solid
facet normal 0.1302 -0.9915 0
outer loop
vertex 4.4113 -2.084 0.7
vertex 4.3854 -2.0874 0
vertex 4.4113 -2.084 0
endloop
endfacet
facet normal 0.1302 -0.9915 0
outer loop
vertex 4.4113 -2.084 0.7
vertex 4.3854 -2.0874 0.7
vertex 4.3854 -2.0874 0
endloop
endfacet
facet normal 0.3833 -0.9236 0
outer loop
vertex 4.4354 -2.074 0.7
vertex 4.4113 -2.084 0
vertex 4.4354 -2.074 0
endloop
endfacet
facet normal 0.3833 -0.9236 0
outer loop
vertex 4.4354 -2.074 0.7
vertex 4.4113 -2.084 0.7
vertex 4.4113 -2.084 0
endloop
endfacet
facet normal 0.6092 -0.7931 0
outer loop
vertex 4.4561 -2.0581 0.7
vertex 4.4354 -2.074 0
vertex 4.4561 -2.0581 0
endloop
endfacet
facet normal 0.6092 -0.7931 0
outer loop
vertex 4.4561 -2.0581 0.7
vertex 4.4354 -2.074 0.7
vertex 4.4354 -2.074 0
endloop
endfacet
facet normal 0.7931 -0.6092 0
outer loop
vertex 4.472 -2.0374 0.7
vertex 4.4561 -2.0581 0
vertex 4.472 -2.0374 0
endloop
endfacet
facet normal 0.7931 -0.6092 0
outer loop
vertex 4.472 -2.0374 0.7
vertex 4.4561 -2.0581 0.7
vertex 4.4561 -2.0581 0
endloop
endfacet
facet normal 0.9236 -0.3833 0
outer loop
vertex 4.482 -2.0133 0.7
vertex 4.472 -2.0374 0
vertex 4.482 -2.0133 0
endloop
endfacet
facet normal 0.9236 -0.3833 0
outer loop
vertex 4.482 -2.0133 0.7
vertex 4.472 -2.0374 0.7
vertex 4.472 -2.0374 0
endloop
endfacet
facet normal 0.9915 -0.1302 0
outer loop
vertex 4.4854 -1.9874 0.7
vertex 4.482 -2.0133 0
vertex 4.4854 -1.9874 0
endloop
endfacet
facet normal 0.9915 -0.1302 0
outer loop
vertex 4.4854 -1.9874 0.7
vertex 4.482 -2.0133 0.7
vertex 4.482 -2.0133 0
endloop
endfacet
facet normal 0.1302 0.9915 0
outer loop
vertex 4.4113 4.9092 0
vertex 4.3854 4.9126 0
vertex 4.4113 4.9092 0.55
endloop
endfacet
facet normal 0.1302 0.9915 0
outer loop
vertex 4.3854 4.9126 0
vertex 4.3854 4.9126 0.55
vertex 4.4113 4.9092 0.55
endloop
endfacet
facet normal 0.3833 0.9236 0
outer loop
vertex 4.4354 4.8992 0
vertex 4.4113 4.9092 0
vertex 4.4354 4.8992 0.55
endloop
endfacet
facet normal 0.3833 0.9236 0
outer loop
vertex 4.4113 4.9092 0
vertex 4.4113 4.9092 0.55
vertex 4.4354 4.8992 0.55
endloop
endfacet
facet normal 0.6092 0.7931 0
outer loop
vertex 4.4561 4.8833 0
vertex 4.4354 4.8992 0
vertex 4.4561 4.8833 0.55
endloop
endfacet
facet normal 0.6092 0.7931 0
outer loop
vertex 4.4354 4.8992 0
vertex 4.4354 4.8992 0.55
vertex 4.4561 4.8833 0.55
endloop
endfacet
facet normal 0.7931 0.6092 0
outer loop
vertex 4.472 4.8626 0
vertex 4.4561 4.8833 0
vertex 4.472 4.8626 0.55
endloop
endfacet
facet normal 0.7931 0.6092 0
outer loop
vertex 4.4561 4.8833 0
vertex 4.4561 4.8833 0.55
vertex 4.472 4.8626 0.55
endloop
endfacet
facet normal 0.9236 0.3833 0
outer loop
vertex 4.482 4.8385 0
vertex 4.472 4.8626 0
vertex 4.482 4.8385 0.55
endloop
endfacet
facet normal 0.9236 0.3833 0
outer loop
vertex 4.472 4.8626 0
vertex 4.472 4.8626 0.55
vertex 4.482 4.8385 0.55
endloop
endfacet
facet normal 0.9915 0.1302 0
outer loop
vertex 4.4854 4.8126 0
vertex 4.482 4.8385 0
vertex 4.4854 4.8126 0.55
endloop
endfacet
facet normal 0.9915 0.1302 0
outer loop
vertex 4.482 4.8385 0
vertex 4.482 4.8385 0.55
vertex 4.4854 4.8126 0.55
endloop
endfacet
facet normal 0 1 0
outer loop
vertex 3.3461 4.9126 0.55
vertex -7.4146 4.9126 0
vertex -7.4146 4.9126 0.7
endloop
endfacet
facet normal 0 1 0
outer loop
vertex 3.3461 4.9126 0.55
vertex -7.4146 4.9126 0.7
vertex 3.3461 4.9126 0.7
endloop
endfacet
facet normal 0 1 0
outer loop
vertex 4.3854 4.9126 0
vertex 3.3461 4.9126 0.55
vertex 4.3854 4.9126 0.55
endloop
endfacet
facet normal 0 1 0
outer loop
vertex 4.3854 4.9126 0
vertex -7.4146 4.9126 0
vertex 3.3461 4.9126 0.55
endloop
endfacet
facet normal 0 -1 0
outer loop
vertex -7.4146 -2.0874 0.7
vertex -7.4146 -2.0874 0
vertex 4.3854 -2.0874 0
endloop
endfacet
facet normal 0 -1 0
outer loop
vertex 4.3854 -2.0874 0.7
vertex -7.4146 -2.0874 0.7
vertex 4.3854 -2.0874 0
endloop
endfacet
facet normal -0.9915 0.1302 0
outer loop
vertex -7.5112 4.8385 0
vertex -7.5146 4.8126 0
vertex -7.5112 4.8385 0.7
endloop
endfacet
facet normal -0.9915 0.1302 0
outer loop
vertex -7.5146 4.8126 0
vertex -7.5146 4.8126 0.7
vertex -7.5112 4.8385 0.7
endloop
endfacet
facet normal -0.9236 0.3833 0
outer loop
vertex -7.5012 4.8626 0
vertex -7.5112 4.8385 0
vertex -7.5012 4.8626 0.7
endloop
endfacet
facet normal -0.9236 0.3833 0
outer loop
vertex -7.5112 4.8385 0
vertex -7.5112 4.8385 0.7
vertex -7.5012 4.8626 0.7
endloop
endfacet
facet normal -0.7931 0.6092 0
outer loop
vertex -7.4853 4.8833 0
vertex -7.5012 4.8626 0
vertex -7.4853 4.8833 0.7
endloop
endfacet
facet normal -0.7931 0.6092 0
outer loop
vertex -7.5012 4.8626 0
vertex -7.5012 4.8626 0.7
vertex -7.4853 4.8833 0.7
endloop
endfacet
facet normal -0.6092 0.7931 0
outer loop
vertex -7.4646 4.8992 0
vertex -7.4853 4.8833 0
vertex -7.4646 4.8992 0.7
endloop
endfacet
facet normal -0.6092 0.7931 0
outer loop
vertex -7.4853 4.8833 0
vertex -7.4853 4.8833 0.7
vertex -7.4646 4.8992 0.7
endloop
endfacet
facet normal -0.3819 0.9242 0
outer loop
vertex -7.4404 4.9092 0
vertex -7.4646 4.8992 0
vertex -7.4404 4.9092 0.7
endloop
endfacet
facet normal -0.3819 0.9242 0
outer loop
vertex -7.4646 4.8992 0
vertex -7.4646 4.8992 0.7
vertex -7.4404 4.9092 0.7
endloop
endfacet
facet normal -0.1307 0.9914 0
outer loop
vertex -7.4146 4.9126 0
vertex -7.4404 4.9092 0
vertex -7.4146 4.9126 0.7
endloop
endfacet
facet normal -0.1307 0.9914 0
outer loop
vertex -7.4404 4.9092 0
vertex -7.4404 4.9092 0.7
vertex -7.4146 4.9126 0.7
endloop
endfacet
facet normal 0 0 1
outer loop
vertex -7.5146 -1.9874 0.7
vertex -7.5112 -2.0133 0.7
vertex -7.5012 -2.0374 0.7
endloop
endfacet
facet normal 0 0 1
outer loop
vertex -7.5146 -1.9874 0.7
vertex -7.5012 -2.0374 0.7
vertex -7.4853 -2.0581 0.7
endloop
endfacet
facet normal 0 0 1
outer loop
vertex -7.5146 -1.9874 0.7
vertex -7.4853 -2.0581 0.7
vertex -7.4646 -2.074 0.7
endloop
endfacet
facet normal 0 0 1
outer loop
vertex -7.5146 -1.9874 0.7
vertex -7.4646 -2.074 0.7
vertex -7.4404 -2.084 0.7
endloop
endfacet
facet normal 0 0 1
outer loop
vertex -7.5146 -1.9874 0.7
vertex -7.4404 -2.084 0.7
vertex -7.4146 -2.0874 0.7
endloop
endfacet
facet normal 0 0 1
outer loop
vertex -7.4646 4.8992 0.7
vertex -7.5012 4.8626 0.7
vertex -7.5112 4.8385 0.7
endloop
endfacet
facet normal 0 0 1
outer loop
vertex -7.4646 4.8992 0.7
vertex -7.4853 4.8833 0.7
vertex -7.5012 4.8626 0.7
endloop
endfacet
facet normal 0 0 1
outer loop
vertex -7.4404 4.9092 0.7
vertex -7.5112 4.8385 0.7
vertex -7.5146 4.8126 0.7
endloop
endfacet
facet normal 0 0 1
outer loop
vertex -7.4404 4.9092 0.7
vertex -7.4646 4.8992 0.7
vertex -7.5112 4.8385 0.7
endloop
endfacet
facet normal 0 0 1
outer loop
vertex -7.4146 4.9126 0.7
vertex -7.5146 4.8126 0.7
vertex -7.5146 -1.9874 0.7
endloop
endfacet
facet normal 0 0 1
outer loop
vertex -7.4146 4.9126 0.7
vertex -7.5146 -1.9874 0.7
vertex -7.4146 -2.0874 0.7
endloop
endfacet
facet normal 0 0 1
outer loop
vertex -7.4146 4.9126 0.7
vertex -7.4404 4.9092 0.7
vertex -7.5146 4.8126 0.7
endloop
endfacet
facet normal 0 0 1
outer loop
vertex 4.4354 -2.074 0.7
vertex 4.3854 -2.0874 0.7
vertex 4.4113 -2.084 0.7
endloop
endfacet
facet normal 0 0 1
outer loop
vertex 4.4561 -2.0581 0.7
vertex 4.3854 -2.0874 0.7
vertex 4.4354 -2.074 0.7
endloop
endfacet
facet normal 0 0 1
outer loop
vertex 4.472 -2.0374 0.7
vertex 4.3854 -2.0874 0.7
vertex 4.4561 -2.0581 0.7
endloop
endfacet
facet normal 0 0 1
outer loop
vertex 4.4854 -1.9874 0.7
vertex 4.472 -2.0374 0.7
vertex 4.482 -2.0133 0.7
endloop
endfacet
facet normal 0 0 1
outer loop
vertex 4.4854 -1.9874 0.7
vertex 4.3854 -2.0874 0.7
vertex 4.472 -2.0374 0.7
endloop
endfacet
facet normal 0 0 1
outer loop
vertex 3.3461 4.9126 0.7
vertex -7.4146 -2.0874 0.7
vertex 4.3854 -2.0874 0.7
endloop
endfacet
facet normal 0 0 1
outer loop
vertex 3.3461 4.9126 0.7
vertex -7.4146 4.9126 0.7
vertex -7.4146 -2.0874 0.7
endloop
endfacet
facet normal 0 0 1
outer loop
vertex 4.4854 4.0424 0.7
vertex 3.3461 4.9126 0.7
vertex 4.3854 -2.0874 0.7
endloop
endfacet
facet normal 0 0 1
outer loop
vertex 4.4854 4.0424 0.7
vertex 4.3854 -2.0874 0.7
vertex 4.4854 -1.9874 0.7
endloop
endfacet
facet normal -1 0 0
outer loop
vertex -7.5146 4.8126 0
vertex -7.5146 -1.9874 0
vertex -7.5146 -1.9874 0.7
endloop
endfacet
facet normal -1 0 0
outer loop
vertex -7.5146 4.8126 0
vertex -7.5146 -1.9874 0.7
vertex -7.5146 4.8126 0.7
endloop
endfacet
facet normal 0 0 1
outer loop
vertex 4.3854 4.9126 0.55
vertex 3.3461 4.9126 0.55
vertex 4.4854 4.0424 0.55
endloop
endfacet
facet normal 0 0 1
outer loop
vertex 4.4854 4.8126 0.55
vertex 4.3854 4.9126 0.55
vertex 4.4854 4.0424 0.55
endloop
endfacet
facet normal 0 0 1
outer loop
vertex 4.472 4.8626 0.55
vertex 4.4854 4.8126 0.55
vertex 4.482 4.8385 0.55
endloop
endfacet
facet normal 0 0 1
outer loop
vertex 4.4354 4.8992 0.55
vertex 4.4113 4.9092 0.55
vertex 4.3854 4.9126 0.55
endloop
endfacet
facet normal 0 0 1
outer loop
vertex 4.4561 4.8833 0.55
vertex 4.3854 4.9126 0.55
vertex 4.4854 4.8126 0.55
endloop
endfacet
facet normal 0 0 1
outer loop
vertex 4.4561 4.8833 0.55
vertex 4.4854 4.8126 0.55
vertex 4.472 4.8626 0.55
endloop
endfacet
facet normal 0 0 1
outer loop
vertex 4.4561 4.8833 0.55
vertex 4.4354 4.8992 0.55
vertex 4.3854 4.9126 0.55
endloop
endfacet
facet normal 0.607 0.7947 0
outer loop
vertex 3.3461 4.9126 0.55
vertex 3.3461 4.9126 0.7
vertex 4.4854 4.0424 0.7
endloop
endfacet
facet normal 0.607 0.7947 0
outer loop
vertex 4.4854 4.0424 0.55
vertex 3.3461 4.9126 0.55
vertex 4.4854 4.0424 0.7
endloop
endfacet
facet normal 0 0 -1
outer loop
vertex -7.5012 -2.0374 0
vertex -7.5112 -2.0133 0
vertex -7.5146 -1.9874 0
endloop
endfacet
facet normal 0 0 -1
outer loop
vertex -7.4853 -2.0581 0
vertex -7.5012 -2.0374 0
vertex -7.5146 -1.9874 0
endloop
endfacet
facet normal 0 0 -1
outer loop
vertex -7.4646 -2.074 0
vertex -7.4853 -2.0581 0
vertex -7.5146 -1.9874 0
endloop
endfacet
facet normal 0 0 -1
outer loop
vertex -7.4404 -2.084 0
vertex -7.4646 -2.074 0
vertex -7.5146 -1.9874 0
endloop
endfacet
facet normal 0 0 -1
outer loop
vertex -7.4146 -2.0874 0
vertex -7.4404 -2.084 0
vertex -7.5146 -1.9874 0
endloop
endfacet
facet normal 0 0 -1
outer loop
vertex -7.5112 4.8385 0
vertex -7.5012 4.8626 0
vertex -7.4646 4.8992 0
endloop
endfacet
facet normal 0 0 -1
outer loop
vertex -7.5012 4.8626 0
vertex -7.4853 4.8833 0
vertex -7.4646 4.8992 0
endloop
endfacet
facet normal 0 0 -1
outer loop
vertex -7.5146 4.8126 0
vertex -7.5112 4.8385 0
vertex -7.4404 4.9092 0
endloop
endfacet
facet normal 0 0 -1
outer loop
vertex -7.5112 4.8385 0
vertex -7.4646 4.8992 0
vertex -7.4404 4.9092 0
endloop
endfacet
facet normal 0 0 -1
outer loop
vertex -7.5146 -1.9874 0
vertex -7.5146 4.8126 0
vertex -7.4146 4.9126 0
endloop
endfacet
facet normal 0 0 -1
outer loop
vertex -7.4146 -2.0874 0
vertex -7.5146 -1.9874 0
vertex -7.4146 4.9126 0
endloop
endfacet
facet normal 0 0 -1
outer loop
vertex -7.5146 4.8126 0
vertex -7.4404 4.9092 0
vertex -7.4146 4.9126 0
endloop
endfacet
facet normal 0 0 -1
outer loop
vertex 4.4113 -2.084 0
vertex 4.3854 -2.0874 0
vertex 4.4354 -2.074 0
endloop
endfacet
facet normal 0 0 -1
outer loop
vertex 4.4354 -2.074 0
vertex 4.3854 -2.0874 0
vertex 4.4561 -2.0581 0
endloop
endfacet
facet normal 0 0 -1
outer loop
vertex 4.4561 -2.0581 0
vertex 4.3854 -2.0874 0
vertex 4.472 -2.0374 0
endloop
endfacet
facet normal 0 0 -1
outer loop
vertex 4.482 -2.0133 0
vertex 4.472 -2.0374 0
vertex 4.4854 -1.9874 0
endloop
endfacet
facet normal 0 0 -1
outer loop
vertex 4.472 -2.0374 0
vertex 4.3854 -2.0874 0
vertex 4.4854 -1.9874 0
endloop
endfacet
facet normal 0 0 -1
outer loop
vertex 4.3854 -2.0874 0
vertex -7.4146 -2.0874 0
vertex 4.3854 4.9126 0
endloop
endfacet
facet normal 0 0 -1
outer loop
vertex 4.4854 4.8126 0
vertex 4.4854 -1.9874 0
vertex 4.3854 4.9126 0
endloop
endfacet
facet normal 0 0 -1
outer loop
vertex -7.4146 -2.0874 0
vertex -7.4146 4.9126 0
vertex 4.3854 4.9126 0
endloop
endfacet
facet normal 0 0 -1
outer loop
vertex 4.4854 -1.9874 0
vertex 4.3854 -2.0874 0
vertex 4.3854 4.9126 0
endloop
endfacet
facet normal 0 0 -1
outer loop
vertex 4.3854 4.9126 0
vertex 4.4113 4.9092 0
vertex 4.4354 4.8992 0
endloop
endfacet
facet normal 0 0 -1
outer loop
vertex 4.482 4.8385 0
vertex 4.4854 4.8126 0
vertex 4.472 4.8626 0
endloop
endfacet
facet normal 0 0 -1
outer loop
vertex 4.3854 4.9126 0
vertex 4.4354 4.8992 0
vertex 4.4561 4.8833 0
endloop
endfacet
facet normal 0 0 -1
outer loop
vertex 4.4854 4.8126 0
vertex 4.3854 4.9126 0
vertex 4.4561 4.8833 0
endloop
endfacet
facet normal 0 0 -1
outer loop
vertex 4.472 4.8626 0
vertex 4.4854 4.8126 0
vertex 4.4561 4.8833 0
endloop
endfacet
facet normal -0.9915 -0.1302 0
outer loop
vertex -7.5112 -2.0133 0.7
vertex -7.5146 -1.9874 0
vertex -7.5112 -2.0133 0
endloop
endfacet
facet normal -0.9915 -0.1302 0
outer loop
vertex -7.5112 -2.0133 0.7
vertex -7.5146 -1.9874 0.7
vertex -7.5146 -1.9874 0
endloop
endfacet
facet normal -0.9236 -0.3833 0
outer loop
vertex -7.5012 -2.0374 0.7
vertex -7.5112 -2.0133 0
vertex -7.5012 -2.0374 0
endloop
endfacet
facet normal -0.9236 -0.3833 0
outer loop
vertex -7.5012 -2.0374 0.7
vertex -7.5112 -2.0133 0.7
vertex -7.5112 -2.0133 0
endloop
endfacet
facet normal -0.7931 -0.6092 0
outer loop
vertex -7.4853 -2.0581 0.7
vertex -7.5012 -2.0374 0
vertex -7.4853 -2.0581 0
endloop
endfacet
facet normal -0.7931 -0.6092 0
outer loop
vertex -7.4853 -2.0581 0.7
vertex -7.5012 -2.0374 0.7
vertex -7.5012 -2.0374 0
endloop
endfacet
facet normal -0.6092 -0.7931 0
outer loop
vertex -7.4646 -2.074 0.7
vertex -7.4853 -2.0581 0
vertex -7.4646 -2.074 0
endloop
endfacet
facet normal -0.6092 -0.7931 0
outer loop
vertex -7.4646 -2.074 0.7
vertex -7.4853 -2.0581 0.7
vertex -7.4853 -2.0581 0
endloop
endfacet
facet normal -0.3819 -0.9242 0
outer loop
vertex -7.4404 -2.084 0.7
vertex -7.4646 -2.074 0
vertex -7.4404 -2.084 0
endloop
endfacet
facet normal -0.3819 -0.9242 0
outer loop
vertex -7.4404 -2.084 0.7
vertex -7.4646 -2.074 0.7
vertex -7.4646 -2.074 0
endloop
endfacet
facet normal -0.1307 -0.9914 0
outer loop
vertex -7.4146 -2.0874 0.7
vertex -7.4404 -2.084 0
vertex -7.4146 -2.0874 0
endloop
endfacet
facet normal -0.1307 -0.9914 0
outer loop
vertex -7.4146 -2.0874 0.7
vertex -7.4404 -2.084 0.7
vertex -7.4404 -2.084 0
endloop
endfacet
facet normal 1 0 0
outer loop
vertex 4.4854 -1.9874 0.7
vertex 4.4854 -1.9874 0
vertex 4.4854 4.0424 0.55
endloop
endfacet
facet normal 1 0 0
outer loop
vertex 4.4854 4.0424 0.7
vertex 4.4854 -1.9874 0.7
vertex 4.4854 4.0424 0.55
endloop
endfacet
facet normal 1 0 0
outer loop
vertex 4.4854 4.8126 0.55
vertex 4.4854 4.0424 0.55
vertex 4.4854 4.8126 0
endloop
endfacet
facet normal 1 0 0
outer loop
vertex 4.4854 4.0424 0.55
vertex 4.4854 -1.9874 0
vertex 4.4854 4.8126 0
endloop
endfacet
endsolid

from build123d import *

# Parameters (mm, degrees)
SKETCH_1_W          = 12
SKETCH_1_H          = 7
EXTRUDE_1_DEPTH     = 0.7
CUT_EXTRUDE_1_DEPTH = 0.15
FILLET_1_R          = 0.1


with BuildPart() as part:
    # 草图1 → 凸台-拉伸1 (new body)
    with BuildSketch(Plane.XY):
        with Locations((-1.514563107, 1.412621359)):
            Rectangle(SKETCH_1_W, SKETCH_1_H)
    extrude(amount=EXTRUDE_1_DEPTH)

    # 草图2 → 切除-拉伸1 (cut)
    with BuildSketch(Plane.XY.offset(0.7)):
        Polygon((3.346075687, 4.912621359), (4.485436893, 4.042359893), (4.485436893, 4.912621359), align=None)
    extrude(amount=-CUT_EXTRUDE_1_DEPTH, mode=Mode.SUBTRACT)

    # 圆角1
    fillet_1_edges = [part.edges().sort_by_distance(p)[0] for p in [
        (4.485436893, 4.912621359, 0.275),
        (-7.514563107, 4.912621359, 0.35),
        (4.485436893, -2.087378641, 0.35),
        (-7.514563107, -2.087378641, 0.35),
    ]]
    fillet(fillet_1_edges, radius=FILLET_1_R)


solid = part.part
